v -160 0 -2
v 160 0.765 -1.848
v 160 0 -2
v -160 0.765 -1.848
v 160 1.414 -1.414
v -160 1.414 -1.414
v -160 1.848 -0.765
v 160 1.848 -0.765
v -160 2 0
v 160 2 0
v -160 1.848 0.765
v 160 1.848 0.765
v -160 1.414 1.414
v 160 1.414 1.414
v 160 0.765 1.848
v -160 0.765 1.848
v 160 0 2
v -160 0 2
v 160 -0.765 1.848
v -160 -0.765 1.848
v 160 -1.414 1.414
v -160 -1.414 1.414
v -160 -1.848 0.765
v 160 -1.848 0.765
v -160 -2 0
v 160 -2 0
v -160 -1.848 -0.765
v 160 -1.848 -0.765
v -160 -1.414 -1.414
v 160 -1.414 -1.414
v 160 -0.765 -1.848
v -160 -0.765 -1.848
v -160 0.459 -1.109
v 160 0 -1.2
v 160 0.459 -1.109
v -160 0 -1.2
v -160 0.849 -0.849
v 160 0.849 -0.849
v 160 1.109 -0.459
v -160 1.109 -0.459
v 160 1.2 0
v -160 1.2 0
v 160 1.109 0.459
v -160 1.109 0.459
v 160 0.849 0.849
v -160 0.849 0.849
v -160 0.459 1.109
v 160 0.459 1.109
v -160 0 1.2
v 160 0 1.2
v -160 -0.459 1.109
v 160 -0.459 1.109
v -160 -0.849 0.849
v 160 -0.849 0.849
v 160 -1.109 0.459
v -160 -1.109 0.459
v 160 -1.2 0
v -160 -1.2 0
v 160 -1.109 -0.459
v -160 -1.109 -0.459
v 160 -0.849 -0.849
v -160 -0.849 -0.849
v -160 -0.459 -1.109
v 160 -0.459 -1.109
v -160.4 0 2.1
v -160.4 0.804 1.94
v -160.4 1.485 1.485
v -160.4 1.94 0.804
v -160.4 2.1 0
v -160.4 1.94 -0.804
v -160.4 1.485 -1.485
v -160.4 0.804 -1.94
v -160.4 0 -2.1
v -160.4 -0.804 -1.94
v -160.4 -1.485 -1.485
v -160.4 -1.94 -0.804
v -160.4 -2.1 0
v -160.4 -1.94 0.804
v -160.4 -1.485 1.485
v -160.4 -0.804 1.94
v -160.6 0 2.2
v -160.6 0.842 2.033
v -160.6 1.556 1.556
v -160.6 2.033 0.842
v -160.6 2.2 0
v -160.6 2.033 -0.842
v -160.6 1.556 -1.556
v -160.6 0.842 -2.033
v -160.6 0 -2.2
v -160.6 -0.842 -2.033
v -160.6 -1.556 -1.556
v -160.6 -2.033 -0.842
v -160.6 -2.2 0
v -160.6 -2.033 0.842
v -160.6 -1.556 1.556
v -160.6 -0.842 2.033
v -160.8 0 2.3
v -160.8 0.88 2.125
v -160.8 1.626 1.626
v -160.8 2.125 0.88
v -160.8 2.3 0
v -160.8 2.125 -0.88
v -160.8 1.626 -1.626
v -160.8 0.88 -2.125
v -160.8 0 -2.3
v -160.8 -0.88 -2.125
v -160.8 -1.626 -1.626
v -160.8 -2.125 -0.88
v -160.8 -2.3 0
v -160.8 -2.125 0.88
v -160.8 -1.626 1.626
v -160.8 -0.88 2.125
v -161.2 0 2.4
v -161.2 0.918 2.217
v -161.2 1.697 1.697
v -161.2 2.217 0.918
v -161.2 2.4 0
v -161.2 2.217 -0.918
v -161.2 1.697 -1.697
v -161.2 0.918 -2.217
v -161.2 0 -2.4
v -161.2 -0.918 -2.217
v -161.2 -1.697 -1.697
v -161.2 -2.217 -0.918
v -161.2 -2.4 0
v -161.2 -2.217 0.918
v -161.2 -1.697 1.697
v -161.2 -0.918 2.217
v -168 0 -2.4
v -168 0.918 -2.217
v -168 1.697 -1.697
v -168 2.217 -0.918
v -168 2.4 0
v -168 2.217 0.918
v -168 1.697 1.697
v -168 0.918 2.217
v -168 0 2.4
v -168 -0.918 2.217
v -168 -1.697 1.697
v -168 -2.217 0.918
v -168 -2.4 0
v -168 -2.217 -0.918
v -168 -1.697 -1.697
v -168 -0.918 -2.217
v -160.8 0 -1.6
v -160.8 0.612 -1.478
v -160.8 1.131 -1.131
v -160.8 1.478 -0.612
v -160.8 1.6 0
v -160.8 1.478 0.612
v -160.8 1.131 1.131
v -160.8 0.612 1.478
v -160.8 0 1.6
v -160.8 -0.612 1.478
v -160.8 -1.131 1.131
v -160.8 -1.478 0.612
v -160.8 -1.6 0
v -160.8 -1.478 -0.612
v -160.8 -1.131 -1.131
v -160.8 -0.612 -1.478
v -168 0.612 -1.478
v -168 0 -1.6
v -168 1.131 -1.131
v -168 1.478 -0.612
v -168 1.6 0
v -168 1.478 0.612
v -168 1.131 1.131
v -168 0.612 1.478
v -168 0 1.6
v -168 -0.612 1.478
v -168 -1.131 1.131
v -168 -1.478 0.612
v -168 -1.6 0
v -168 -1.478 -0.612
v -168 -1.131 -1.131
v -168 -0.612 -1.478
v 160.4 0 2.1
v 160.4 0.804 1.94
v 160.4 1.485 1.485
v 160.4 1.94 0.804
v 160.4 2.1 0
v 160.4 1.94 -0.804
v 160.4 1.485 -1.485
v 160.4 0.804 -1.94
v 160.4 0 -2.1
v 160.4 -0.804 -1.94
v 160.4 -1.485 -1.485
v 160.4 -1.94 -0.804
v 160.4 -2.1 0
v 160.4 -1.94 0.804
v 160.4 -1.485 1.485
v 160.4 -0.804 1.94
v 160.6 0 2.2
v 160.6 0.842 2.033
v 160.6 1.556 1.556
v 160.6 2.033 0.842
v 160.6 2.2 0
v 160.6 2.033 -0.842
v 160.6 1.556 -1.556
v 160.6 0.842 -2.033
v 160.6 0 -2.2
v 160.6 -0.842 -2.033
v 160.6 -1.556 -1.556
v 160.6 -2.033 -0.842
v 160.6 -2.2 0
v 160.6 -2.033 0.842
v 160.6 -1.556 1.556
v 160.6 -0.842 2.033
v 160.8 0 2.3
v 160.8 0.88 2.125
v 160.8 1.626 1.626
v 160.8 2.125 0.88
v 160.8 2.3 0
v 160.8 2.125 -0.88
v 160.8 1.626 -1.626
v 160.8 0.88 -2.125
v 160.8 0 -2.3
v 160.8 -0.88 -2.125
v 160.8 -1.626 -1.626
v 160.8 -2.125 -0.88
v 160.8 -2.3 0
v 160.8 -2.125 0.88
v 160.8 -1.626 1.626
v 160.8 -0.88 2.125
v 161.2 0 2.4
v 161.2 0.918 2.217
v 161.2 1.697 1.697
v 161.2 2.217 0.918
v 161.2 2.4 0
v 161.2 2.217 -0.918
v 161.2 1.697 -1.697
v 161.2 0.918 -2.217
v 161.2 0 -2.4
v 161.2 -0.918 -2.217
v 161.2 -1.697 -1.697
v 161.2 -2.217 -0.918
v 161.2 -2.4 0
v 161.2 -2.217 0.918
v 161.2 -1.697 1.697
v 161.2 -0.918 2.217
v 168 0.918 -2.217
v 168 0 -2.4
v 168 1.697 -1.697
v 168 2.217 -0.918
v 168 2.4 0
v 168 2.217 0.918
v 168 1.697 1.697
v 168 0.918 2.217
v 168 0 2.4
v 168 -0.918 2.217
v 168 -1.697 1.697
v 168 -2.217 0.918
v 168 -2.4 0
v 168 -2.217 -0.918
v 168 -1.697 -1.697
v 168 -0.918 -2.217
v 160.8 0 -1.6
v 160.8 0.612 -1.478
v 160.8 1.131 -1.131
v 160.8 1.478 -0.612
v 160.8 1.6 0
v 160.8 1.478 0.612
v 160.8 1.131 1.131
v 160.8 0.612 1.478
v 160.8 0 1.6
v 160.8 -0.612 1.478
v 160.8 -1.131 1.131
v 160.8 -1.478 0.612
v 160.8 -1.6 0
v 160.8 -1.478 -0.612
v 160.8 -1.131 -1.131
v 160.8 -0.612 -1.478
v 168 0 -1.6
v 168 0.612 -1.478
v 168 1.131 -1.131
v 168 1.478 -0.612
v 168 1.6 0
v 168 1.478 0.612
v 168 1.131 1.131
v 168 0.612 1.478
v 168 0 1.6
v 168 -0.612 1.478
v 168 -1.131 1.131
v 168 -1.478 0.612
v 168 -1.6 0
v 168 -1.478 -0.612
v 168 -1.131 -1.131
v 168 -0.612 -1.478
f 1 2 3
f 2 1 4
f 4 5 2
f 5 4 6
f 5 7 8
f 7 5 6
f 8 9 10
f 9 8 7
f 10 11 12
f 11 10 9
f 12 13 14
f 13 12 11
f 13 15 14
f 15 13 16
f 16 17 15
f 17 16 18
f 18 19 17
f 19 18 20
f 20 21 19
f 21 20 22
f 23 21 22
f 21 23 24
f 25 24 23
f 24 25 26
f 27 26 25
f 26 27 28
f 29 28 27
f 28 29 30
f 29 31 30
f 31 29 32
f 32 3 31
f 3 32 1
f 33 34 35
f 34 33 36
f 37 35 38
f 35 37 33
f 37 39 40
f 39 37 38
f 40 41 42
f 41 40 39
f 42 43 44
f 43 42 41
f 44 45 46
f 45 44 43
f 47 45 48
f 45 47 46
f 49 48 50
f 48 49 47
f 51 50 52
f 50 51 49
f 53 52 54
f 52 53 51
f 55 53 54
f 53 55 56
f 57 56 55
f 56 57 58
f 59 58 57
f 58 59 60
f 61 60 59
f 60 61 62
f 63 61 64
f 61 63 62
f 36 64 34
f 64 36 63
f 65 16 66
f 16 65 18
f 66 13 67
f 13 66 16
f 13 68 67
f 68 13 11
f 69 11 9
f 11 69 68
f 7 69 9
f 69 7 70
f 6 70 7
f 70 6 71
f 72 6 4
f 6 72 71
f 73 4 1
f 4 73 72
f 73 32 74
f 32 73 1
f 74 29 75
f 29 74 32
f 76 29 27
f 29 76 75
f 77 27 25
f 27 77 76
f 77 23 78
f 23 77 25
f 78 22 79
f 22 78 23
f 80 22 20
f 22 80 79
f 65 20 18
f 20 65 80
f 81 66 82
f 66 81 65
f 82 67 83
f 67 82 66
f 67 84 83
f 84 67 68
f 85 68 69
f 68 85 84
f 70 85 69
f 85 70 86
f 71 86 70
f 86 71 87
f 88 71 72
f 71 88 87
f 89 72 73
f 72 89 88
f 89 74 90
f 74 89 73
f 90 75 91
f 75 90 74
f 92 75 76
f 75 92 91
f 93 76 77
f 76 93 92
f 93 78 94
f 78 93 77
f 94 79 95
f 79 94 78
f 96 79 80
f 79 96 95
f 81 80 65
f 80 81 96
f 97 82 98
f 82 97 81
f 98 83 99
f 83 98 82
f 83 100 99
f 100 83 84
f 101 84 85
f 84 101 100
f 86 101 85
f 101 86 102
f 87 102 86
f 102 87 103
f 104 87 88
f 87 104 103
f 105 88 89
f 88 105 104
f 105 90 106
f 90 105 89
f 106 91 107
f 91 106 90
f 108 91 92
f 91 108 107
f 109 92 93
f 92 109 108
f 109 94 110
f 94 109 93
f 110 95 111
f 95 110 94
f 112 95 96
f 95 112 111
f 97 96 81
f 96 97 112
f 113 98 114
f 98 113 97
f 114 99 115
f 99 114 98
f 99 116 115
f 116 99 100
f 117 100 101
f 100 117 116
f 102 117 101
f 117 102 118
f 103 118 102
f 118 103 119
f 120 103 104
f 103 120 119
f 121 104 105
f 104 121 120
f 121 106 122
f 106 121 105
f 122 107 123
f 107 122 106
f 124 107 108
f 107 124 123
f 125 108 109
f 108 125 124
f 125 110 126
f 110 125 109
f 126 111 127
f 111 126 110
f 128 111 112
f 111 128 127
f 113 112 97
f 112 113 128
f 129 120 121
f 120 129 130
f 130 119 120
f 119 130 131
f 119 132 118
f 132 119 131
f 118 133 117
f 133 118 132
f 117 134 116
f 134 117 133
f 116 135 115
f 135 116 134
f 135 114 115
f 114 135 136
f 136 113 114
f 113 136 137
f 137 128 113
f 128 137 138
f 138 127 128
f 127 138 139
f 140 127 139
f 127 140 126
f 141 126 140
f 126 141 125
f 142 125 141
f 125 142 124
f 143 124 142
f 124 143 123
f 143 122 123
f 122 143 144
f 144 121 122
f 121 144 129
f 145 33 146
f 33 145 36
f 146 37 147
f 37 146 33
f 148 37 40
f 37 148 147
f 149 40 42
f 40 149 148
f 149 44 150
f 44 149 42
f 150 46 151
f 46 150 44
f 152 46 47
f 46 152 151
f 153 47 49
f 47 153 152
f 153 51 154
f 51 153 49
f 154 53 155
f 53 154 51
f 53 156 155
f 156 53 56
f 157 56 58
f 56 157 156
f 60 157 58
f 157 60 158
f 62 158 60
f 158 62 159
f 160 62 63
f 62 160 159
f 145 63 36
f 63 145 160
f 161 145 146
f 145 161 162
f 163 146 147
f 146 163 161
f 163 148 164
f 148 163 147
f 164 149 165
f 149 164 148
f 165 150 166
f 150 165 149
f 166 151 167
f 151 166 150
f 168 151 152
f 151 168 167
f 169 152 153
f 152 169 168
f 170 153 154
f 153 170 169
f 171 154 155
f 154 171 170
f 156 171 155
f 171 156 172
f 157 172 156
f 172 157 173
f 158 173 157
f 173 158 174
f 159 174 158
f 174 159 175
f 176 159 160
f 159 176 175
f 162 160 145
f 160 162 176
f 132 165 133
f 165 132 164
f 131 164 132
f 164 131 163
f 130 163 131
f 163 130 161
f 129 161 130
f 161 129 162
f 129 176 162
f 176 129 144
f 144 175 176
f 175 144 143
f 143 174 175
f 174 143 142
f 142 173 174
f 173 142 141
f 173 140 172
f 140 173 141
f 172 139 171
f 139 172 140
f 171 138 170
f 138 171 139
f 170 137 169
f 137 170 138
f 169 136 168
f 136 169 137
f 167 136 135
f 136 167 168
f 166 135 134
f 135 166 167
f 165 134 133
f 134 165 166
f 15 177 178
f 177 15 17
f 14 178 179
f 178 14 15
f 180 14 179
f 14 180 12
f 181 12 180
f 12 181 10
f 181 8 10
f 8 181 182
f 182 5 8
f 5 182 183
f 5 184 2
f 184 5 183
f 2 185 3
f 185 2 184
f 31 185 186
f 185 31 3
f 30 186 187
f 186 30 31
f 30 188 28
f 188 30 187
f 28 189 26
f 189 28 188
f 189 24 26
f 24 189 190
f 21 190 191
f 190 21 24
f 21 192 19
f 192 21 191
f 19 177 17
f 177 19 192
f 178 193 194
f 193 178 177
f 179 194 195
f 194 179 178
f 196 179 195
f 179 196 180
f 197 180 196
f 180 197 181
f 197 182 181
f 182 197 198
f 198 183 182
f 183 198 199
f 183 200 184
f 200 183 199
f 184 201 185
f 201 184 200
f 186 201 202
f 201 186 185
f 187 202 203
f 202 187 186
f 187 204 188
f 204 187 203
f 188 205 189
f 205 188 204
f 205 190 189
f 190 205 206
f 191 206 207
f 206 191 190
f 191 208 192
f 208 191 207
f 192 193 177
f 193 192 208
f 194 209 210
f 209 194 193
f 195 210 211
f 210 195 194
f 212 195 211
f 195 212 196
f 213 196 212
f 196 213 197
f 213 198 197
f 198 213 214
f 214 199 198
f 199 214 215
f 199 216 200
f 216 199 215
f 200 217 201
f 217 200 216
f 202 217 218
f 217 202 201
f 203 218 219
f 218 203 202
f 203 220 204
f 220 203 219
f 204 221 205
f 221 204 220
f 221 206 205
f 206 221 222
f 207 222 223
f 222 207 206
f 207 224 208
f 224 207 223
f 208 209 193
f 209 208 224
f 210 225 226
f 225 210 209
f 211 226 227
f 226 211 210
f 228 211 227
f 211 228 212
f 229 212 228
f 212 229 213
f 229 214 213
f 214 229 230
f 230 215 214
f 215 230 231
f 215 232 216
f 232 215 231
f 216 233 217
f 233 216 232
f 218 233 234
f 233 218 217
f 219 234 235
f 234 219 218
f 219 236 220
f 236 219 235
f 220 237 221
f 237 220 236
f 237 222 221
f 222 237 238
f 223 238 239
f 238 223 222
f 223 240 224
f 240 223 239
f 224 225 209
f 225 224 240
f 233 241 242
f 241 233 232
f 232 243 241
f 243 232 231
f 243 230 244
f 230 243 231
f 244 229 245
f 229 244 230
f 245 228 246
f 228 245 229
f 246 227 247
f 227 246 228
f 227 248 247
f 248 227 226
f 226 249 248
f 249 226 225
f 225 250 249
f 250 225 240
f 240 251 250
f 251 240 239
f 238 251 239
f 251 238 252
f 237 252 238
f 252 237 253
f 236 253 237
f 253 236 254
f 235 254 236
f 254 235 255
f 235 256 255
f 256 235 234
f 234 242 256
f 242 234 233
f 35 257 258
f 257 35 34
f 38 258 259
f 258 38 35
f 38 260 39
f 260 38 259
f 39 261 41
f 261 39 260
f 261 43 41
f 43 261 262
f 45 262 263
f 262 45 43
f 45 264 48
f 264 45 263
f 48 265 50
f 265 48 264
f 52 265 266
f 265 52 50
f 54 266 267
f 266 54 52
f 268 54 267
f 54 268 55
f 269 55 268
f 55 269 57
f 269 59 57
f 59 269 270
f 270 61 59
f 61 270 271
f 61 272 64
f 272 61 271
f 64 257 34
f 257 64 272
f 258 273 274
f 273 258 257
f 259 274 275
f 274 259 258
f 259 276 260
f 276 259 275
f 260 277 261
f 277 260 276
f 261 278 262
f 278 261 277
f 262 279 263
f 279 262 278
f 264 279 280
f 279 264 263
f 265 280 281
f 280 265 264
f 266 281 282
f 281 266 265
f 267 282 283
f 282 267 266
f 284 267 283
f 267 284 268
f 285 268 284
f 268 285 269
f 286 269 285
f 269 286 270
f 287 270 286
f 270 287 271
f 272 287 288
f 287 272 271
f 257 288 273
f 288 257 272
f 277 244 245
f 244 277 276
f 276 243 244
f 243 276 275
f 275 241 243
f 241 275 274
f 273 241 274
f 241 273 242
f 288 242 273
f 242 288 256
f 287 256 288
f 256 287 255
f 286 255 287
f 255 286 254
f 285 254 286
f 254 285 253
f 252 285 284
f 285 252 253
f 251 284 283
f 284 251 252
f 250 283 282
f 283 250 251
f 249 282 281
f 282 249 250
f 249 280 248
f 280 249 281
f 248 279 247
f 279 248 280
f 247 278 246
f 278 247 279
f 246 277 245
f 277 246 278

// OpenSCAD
use <../lib.scad>
use <71533k01.scad>
use <71533k03.scad>
$fa=1; $fs=0.2;
function ldraw_lib__44079_f2(realsolid=false) = [
// 0 Technic Pneumatic Tube 42L with End Bulges
// 0 Name: 44079-f2.dat
// 0 Author: Philippe Hurbain [Philo]
// 0 !LDRAW_ORG Part UPDATE 2020-01
// 0 !LICENSE Licensed under CC BY 2.0 and CC BY 4.0 : see CAreadme.txt
// 
// 0 BFC CERTIFY CCW
  [0,"BFC","CERTIFY"],
  [0,"BFC","CCW"],
// 
// 0 !KEYWORDS 336 mm
// 
// 0 !HISTORY 2020-06-28 [PTadmin] Official Update 2020-01
// 
// 
// 1 16 -400 0 0 0 800 0 1 0 0 0 0 1 71533k03.dat
  [1,16,-400,0,0,0,800,0,1,0,0,0,0,1, ldraw_lib__71533k03(realsolid)],
// 1 16 -400 0 0 0 -1 0 1 0 0 0 0 1 71533k01.dat
  [1,16,-400,0,0,0,-1,0,1,0,0,0,0,1, ldraw_lib__71533k01(realsolid)],
// 1 16 400 0 0 0 1 0 1 0 0 0 0 1 71533k01.dat
  [1,16,400,0,0,0,1,0,1,0,0,0,0,1, ldraw_lib__71533k01(realsolid)],
];
module ldraw_lib__44079_f2(step=0, col=false, unit=2/5, alt=false, line=0.2, solid=!$preview)
    makepoly(ldraw_lib__44079_f2(solid), step=step, col=col, unit=unit, alt=alt, line=line, solid=solid);
ldraw_lib__44079_f2(line=0.2);
